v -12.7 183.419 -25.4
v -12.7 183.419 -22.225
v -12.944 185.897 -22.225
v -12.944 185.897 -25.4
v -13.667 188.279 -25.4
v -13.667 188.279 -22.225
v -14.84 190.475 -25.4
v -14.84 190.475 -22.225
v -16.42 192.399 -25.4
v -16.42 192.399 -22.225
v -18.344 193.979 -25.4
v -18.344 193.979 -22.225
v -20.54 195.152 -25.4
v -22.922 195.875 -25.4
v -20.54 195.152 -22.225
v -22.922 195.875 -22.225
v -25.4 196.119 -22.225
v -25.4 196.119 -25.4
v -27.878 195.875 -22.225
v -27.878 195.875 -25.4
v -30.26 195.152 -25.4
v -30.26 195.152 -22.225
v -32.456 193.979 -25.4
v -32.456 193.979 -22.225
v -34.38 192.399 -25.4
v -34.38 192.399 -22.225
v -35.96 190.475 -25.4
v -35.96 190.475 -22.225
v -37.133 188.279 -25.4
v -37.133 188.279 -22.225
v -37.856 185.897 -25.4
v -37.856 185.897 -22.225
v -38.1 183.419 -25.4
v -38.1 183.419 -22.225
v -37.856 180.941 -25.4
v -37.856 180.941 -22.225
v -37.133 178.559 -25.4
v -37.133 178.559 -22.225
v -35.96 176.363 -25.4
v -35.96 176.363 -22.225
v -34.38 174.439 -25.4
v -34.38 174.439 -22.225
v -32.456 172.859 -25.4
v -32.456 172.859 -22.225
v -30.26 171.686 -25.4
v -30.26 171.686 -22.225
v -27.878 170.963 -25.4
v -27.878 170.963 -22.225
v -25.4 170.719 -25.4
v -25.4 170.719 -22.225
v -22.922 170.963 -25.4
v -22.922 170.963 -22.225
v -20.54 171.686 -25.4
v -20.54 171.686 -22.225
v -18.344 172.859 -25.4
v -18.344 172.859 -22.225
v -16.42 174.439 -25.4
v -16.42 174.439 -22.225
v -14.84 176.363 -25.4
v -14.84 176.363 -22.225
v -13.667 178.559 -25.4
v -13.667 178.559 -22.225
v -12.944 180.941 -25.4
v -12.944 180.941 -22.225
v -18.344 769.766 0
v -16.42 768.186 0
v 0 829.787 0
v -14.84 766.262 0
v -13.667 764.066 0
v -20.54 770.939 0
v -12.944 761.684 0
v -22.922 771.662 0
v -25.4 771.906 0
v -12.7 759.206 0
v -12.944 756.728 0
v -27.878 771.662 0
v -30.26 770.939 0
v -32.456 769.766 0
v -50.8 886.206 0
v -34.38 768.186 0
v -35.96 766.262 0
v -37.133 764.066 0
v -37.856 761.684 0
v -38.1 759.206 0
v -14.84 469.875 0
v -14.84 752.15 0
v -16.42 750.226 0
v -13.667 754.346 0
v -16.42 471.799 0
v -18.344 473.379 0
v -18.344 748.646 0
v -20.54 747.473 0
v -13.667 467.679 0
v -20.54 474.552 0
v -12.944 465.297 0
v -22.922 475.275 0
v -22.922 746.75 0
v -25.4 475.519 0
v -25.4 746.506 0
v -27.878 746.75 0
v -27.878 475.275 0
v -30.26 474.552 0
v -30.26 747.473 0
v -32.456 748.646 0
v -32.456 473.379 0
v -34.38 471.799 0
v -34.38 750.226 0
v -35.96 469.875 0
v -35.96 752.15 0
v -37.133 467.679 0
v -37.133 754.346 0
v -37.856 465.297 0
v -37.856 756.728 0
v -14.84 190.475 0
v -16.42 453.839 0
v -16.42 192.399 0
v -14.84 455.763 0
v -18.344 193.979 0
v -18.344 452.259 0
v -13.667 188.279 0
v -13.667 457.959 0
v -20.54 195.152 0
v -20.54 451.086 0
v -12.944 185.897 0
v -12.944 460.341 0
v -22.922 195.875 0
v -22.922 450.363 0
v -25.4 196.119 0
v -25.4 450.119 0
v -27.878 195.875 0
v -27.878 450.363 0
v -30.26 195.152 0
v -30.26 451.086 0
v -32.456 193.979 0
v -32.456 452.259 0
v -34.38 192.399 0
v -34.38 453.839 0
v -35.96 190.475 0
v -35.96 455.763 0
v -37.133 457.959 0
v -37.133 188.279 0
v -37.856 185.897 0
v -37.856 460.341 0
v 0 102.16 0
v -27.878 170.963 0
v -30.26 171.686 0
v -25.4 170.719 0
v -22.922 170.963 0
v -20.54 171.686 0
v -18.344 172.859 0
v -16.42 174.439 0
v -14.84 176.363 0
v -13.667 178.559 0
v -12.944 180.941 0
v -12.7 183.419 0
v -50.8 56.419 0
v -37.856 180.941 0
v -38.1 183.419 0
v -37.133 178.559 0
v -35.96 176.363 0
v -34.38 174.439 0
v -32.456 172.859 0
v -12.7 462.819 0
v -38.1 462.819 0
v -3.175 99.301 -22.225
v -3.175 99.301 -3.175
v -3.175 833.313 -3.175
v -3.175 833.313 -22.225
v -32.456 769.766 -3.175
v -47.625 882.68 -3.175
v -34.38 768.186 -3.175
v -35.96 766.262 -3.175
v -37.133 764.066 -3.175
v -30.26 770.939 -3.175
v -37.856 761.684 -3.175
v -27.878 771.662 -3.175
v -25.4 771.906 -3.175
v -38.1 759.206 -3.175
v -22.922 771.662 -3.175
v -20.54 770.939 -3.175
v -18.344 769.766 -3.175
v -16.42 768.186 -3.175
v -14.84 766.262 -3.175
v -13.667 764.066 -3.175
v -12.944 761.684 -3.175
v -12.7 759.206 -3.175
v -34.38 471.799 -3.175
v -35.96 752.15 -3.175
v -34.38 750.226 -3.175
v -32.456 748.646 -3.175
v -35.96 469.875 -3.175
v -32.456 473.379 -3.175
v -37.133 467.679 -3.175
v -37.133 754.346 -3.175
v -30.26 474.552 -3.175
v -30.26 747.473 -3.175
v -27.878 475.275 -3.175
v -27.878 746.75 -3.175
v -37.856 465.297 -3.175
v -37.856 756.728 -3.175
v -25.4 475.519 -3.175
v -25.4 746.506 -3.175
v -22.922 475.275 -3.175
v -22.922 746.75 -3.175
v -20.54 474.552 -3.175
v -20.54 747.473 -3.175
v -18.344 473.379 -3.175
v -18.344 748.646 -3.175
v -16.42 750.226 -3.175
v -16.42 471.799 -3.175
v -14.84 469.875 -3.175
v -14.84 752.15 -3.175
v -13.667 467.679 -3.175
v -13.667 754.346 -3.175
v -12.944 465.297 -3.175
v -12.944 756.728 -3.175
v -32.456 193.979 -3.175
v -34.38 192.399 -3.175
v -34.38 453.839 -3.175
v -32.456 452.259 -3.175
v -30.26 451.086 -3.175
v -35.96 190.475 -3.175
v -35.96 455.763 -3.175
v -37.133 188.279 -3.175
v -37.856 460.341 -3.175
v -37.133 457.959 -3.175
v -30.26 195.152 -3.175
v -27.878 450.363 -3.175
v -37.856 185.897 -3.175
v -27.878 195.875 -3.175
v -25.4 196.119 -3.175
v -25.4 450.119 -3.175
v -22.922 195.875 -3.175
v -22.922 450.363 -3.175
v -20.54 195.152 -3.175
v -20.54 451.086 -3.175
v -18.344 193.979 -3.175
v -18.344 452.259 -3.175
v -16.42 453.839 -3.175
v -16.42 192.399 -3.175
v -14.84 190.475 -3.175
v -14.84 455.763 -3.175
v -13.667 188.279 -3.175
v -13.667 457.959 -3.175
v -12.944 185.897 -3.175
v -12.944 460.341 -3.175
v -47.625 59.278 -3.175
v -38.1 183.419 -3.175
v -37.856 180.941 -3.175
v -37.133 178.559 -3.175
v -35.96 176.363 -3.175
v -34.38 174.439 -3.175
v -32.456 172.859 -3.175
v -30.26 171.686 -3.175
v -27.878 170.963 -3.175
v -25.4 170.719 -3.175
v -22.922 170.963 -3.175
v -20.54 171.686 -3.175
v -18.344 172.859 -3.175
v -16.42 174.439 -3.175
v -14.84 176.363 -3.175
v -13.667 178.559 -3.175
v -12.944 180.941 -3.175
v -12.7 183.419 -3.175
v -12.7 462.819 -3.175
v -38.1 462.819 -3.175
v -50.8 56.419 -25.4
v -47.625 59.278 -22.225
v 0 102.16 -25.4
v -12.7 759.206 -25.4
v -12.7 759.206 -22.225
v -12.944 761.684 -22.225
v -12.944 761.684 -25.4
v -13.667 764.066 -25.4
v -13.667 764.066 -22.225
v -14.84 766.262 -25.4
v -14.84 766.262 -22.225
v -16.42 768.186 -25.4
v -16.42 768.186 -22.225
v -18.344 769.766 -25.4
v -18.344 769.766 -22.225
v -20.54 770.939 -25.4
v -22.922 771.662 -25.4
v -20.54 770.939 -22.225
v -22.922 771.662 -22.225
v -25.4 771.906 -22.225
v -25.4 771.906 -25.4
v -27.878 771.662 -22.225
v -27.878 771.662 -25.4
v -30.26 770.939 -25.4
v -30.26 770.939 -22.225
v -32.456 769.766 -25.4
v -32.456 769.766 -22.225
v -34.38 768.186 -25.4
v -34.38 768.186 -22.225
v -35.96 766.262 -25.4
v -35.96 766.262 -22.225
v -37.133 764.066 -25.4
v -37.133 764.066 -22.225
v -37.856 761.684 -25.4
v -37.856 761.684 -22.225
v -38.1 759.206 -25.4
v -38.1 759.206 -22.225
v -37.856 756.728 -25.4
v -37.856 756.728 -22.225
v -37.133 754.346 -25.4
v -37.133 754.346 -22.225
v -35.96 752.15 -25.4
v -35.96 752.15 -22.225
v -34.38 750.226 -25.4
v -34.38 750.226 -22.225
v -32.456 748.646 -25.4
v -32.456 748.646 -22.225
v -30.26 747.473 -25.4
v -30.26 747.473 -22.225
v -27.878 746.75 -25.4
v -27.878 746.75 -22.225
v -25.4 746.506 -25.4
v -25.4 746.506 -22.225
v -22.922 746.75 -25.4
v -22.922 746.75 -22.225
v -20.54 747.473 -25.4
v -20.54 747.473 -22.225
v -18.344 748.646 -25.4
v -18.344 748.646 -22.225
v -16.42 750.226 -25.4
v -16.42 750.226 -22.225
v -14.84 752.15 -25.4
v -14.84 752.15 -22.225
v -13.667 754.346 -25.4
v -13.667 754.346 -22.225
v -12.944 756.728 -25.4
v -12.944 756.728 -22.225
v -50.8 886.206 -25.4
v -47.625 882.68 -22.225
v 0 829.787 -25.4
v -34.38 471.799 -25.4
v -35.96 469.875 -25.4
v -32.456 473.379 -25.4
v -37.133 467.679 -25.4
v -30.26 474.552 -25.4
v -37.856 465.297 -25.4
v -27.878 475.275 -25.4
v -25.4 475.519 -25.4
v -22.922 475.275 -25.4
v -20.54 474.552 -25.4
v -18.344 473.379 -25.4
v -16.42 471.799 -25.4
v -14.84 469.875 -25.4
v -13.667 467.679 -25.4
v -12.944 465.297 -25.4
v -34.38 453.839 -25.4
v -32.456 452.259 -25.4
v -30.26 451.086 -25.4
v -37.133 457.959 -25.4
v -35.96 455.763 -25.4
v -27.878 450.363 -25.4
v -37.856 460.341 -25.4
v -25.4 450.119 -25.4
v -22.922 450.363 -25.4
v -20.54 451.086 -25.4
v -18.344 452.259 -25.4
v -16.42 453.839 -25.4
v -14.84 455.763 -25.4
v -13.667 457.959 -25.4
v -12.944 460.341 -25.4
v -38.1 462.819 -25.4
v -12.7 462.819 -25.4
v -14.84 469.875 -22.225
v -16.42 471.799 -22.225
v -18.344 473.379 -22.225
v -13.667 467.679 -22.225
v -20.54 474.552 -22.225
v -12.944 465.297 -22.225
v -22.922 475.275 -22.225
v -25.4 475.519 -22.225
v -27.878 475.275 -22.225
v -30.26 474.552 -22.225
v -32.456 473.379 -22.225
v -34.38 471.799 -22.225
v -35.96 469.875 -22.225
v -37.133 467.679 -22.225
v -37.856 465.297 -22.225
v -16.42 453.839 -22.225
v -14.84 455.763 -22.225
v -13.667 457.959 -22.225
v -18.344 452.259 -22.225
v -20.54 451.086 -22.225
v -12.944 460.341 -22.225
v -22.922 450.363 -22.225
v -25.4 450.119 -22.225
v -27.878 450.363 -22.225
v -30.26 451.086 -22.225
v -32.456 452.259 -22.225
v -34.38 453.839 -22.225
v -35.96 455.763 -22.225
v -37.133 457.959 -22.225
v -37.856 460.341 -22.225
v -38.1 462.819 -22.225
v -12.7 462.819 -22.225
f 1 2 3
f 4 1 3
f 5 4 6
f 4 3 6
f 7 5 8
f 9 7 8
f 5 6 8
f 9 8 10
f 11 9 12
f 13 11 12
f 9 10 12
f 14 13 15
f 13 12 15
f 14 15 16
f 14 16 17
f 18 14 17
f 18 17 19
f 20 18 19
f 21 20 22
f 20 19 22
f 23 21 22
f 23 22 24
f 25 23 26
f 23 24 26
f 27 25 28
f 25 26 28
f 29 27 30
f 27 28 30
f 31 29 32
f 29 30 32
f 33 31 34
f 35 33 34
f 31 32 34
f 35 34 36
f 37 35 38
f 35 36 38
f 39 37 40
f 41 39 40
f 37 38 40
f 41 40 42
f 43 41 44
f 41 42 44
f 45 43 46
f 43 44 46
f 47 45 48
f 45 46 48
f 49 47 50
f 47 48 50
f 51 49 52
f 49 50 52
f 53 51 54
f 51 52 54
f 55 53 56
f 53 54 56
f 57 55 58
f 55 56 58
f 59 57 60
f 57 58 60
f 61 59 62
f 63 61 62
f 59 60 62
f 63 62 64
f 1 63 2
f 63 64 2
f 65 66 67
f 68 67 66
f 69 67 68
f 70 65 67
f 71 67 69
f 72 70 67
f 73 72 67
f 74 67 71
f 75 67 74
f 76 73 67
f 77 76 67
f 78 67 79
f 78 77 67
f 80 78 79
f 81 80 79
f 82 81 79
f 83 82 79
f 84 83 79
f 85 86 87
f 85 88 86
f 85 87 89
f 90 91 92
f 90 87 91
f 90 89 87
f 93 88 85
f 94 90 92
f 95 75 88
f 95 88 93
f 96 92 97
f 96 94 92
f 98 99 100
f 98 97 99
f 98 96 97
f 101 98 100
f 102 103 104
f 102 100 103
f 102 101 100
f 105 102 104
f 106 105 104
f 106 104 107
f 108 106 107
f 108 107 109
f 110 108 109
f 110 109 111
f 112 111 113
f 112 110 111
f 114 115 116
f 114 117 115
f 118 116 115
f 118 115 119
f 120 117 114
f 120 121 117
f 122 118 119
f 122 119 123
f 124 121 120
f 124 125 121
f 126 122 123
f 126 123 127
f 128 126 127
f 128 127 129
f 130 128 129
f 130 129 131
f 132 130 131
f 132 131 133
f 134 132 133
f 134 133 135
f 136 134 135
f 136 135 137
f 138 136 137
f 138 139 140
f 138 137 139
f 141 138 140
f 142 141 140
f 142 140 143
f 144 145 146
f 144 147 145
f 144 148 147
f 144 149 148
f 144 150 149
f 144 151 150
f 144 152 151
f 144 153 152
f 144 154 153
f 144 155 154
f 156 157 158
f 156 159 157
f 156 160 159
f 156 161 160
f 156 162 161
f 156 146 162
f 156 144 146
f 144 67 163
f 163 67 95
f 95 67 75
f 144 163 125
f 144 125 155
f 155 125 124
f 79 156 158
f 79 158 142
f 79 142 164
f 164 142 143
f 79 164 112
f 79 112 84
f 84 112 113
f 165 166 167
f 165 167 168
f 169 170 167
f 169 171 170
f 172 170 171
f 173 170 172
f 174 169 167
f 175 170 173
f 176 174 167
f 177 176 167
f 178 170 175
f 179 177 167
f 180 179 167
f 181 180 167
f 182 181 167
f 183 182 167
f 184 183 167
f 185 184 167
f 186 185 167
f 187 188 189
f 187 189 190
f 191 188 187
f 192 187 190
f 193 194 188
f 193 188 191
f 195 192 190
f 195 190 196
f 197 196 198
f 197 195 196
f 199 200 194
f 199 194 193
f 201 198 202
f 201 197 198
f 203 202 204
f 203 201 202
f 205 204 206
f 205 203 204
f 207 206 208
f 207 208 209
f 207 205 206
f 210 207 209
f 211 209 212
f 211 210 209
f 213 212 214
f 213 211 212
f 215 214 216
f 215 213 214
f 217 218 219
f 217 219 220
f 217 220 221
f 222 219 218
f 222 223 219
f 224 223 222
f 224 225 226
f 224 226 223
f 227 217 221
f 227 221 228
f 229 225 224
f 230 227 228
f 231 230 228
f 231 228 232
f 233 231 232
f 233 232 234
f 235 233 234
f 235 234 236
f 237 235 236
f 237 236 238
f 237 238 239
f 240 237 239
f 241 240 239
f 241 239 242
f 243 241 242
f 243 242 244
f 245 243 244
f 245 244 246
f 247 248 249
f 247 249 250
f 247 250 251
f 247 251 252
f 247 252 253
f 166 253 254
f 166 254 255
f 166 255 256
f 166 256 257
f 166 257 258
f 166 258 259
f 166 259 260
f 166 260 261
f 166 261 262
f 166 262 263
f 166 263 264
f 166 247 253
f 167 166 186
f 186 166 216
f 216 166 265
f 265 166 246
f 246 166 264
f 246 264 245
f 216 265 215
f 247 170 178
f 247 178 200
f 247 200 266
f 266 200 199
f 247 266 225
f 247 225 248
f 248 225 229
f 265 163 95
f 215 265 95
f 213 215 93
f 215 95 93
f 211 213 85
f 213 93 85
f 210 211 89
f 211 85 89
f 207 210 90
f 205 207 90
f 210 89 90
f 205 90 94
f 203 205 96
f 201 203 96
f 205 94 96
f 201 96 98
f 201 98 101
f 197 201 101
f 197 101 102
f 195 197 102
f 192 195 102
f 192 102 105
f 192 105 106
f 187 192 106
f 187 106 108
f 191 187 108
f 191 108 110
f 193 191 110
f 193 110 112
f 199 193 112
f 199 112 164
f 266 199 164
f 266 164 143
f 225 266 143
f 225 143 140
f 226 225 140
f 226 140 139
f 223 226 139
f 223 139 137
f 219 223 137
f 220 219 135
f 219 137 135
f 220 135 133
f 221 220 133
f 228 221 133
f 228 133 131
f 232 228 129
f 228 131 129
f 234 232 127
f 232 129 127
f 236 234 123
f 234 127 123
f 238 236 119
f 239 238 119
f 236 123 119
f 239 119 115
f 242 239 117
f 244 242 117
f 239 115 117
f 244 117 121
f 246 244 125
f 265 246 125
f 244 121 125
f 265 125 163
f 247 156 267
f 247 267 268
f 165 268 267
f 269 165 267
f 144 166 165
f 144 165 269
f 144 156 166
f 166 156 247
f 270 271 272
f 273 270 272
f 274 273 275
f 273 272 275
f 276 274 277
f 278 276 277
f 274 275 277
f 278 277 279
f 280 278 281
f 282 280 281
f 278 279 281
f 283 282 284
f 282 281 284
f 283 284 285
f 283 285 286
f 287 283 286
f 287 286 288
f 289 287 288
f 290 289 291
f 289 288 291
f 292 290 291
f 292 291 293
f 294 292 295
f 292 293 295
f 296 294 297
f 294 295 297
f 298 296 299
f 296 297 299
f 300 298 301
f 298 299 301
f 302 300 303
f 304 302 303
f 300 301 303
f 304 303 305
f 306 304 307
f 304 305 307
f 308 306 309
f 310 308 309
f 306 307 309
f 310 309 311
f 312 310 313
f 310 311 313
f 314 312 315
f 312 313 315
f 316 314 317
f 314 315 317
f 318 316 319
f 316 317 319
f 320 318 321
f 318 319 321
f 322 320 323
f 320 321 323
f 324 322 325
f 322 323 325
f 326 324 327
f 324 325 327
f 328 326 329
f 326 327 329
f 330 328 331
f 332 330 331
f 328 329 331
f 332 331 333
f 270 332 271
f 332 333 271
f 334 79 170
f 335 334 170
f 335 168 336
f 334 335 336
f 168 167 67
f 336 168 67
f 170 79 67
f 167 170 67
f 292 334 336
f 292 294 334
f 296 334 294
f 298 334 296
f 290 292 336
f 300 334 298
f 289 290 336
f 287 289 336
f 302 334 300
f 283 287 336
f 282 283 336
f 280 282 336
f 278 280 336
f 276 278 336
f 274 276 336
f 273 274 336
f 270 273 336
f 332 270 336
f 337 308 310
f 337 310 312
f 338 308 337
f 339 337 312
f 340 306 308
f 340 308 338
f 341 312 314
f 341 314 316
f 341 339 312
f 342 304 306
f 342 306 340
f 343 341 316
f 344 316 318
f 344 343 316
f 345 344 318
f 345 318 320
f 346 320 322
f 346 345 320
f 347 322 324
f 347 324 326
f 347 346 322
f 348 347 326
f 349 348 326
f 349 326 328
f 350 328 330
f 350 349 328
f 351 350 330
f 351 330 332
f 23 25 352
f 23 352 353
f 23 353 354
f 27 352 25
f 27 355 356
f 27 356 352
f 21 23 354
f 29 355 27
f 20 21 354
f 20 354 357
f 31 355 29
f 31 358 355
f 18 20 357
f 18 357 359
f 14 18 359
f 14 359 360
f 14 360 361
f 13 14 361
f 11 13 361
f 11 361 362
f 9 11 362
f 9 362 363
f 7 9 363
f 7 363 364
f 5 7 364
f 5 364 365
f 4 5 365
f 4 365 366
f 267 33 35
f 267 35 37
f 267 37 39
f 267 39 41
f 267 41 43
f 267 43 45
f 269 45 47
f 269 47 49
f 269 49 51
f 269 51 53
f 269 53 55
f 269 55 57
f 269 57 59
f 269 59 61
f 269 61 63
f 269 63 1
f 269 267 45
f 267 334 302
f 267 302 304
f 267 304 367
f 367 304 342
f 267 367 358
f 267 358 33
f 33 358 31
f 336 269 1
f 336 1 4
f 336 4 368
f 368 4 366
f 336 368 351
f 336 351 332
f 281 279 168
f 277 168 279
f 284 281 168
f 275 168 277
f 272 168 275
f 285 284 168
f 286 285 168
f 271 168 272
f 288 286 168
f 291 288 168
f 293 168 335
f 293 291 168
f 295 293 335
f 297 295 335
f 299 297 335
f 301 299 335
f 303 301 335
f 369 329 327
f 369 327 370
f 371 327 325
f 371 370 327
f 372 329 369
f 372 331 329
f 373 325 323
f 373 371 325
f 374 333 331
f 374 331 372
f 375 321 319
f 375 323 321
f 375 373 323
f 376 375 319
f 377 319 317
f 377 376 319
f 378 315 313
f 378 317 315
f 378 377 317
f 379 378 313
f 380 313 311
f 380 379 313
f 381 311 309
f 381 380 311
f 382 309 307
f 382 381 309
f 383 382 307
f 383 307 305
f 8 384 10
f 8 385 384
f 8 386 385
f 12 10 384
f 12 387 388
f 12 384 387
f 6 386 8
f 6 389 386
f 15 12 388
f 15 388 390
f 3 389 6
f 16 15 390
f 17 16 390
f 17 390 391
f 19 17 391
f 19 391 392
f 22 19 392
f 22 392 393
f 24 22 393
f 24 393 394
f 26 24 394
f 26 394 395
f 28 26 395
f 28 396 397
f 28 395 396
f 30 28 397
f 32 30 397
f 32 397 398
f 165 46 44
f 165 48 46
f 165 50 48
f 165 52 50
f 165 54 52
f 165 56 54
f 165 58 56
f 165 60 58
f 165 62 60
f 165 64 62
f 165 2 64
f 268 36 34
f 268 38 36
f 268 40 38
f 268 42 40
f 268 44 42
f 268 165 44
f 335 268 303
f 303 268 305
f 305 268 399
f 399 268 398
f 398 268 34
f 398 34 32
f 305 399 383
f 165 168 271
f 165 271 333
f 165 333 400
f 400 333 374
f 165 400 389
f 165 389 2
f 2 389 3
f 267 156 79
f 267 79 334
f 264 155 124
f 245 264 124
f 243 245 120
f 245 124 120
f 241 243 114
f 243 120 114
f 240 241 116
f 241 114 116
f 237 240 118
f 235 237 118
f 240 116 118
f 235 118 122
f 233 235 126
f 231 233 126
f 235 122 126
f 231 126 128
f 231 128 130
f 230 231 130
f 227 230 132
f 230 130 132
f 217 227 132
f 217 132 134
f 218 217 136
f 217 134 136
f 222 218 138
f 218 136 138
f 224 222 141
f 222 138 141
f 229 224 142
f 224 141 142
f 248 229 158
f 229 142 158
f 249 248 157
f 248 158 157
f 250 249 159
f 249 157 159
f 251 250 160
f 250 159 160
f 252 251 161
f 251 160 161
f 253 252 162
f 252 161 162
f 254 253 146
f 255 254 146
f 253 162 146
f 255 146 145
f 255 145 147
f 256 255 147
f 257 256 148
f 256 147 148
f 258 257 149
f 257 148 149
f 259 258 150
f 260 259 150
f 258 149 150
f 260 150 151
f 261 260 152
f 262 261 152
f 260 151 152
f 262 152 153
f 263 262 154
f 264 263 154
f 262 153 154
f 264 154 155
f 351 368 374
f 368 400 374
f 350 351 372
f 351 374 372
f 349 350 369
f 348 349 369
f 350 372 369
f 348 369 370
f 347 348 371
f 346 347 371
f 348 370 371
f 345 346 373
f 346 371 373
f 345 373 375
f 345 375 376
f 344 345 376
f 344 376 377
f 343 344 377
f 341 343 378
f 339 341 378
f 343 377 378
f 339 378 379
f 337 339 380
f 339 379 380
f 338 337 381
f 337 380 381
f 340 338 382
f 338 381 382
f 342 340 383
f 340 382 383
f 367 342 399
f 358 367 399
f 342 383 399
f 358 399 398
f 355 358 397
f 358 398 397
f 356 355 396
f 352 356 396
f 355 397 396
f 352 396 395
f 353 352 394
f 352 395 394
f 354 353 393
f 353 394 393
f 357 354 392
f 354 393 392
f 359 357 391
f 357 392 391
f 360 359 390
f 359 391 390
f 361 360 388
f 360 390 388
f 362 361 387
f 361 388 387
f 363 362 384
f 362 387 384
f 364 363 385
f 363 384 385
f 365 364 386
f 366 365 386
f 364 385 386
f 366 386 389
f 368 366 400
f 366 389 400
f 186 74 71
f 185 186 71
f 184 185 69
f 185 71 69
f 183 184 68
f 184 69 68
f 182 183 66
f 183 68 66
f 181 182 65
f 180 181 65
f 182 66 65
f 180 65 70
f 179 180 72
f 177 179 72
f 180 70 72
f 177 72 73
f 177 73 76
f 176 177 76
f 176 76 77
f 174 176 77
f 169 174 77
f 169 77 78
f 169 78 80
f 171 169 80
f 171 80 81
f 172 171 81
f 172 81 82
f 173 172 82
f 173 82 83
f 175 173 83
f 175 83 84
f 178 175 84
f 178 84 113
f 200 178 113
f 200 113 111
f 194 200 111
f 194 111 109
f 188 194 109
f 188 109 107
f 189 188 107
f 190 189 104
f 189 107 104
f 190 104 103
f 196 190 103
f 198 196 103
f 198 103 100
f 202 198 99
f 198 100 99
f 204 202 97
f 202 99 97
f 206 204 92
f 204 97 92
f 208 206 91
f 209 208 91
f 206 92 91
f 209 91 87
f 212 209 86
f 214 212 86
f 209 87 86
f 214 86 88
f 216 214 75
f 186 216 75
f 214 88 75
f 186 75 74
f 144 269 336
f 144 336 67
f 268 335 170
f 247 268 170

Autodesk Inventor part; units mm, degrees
ref_plane "YZ Plane" through (0, 0, 0) normal (1, 0, 0) x (0, 1, 0)
ref_plane "XZ Plane" through (0, 0, 0) normal (0, 1, 0) x (-1, 0, 0)
ref_plane "XY Plane" through (0, 0, 0) normal (0, 0, 1) x (1, 0, 0)
sketch "Sketch1" plane through (0, 0, 0) normal (0, 1, 0) x (-1, 0, 0)
  line L0 (0, 0) -> (50.8, 0)
  line L1 (50.8, 0) -> (50.8, -25.4)
  line L2 (50.8, -25.4) -> (0, -25.4)
  line L3 (0, -25.4) -> (0, 0)
  line L4 (47.625, -22.225) -> (47.625, -3.175)
  line L5 (47.625, -3.175) -> (3.175, -3.175)
  line L6 (3.175, -3.175) -> (3.175, -22.225)
  line L7 (3.175, -22.225) -> (47.625, -22.225)
  dimension "d0" = 50.8
  dimension "d1" = 25.4
  dimension "d2" = 3.175
extrude "Extrusion1" add sketch "Sketch1" along normal blind 886.206
sketch "Sketch2" plane through (-50.8, 0, 0) normal (0, 0, 1) x (1, 0, 0)
  line L0 (50.8, 0) -> (0, 0) projected
  line L1 (50.8, 0) -> (50.8, 886.206) projected
  line L2 (0, 886.206) -> (50.8, 886.206) projected
  line L3 (0, 0) -> (0, 886.206) projected
  line L4 (0, 0) -> (50.8, 0) projected
  line L5 (50.8, 0) -> (0, 56.4191)
  line L6 (0, 56.4191) -> (50.8, 56.4191)
  line L7 (50.8, 56.4191) -> (50.8, 0)
  line L8 (50.8, 0) -> (0, 0)
  line L9 (0, 0) -> (0, 56.4191)
  line L10 (0, 56.4191) -> (50.8, 0)
  line L11 (0, 56.4191) -> (21.859, 0)
  line L12 (47.625, 0) -> (3.175, 0) projected
  dimension "d5" = 48
extrude "Extrusion2" cut sketch "Sketch2" against normal blind 914.4 contours L0 L11 L5 | L11 L0 L3
sketch "Sketch3" plane through (-50.8, 886.206, 0) normal (0, 0, 1) x (1, 0, 0)
  line L0 (0, -829.7869) -> (50.8, -886.206) projected
  line L1 (50.8, -886.206) -> (50.8, 0) projected
  line L2 (0, 0) -> (50.8, 0) projected
  line L3 (0, -829.7869) -> (0, 0) projected
  line L4 (0, -829.7869) -> (50.8, -886.206) projected
  line L5 (0, -829.7869) -> (50.8, -784.0464)
  line L6 (50.8, -886.206) -> (50.8, 0) projected
  line L7 (0, -829.7869) -> (0, 0) projected
  line L8 (50.8, -886.206) -> (0, -886.206)
  line L9 (0, -886.206) -> (0, -923.3654)
  line L10 (0, -923.3654) -> (50.8, -923.3654)
  line L11 (50.8, -923.3654) -> (50.8, -886.206)
  dimension "d8" = 90
extrude "Extrusion3" cut sketch "Sketch3" against normal blind 25.4 contours L5 L1 L0
sketch "Sketch4" plane through (-50.8, 886.206, 0) normal (0, 0, 1) x (1, 0, 0)
  line L0 (0, -829.7869) -> (50.8, -784.0464) projected
  line L1 (50.8, -784.0464) -> (50.8, 0) projected
  line L2 (0, 0) -> (50.8, 0) projected
  line L3 (0, -829.7869) -> (0, 0) projected
  line L4 (0, 0) -> (50.8, 0) projected
  line L5 (0, 0) -> (50.8, 0)
  line L6 (50.8, 0) -> (50.8, -221.7928)
  line L7 (50.8, -221.7928) -> (0, -221.7928)
  line L8 (0, -221.7928) -> (0, 0)
  line L9 (0, -829.7869) -> (0, 0) projected
  line L10 (0, 0) -> (50.8, -56.4191)
  line L11 (50.8, 0) -> (0, 0)
  line L12 (0, 0) -> (0, -56.4191)
  line L13 (0, -56.4191) -> (50.8, -56.4191)
  line L14 (50.8, -56.4191) -> (50.8, 0)
  point P0 (50.8, -886.206)
  dimension "d11" = 221.7928
  dimension "d12" = 48
  dimension "d13" = 56.4191
extrude "Extrusion4" cut sketch "Sketch4" against normal blind 25.4 contours L10 L2 L1
sketch "Sketch8" plane through (-50.8, 56.4191, 0) normal (0, 0, 1) x (1, 0, 0)
  circle A0 centre (25.4, 702.7869) radius 12.7
  line L0 (0, 0) -> (0, 829.7869) projected
  circle A1 centre (25.4, 127) radius 12.7
  circle A2 centre (25.4, 406.4) radius 12.7
  point P0 (50.8, -56.4191)
  dimension "d24" = 25.4
  dimension "d25" = 25.4
  dimension "d26" = 127
  dimension "d27" = 25.4
  dimension "d28" = 25.4
  dimension "d29" = 127
  dimension "d32" = 25.4
  dimension "d37" = 279.4
extrude "Extrusion8" cut sketch "Sketch8" against normal blind 25.4
properties part number "AngleBrace.ver1-1111-2020"
